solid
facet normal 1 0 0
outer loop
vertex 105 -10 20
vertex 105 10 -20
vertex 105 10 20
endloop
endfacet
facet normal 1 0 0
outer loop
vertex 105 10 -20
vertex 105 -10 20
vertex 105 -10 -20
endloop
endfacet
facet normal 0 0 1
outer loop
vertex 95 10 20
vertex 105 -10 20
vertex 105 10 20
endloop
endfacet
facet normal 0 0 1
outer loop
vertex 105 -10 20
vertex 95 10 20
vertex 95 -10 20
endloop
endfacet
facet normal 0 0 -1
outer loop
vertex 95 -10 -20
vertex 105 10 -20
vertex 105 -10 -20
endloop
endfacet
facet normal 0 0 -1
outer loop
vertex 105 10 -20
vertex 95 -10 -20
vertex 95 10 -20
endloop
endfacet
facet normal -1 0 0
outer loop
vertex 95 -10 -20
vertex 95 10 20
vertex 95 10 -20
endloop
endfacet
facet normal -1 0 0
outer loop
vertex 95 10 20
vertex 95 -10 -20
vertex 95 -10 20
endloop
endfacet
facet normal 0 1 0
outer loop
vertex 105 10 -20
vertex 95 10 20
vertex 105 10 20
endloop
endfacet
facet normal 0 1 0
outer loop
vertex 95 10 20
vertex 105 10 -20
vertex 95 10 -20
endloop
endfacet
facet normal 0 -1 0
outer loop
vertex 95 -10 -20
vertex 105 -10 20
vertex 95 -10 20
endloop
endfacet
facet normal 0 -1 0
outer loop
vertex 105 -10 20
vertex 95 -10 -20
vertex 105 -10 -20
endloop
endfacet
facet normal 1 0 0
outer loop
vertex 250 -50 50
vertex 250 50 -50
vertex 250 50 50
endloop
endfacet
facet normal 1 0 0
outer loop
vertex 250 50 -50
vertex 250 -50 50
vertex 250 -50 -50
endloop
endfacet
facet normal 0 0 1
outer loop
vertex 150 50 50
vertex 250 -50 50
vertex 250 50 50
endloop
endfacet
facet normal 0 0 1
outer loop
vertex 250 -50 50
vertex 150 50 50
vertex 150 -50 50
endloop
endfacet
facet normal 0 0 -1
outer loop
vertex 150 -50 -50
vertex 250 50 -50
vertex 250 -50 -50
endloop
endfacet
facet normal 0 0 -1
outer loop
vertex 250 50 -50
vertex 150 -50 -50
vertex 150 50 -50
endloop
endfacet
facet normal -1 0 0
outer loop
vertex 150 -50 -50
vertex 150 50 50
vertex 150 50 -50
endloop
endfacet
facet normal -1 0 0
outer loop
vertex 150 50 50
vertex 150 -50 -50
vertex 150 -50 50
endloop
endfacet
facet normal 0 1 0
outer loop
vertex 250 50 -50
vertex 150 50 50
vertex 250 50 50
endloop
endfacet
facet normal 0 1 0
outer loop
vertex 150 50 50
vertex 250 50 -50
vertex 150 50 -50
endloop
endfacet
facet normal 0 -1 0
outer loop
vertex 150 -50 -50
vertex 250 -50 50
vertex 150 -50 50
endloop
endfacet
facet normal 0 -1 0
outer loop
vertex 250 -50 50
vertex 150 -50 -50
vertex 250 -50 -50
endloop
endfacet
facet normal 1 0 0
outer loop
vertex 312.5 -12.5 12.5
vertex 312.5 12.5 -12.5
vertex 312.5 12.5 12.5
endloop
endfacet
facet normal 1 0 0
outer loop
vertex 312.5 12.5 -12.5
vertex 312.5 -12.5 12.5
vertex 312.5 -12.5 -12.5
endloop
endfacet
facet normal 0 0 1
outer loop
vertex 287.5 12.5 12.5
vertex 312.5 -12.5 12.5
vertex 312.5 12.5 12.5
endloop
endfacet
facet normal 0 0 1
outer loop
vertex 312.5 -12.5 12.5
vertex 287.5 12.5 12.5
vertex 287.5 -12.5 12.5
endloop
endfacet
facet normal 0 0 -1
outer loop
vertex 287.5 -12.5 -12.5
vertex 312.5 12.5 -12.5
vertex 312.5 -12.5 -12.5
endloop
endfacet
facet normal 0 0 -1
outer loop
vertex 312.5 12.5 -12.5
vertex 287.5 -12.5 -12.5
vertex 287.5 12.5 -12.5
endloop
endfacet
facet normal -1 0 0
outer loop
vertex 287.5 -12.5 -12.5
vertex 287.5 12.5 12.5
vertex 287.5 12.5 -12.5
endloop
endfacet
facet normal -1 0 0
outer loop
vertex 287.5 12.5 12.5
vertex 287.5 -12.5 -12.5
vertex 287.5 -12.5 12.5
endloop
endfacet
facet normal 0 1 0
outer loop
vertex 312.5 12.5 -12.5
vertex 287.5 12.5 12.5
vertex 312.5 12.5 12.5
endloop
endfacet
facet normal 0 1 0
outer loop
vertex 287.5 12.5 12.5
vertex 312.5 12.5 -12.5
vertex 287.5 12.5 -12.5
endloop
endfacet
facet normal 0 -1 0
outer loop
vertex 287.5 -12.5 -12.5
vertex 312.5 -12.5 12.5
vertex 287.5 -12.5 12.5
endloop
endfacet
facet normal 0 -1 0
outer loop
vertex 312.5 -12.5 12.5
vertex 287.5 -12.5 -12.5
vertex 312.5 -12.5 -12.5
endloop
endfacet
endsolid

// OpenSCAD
translate([100.0,0.0,0.0]){cube(size=[10.0000,20.0000,40.0000],center=true);}translate([200.0,0.0,0.0]){cube(size=[100.0000,100.0000,100.0000],center=true);}translate([300.0,0.0,0.0]){cube(size=[25.0000,25.0000,25.0000],center=true);}
